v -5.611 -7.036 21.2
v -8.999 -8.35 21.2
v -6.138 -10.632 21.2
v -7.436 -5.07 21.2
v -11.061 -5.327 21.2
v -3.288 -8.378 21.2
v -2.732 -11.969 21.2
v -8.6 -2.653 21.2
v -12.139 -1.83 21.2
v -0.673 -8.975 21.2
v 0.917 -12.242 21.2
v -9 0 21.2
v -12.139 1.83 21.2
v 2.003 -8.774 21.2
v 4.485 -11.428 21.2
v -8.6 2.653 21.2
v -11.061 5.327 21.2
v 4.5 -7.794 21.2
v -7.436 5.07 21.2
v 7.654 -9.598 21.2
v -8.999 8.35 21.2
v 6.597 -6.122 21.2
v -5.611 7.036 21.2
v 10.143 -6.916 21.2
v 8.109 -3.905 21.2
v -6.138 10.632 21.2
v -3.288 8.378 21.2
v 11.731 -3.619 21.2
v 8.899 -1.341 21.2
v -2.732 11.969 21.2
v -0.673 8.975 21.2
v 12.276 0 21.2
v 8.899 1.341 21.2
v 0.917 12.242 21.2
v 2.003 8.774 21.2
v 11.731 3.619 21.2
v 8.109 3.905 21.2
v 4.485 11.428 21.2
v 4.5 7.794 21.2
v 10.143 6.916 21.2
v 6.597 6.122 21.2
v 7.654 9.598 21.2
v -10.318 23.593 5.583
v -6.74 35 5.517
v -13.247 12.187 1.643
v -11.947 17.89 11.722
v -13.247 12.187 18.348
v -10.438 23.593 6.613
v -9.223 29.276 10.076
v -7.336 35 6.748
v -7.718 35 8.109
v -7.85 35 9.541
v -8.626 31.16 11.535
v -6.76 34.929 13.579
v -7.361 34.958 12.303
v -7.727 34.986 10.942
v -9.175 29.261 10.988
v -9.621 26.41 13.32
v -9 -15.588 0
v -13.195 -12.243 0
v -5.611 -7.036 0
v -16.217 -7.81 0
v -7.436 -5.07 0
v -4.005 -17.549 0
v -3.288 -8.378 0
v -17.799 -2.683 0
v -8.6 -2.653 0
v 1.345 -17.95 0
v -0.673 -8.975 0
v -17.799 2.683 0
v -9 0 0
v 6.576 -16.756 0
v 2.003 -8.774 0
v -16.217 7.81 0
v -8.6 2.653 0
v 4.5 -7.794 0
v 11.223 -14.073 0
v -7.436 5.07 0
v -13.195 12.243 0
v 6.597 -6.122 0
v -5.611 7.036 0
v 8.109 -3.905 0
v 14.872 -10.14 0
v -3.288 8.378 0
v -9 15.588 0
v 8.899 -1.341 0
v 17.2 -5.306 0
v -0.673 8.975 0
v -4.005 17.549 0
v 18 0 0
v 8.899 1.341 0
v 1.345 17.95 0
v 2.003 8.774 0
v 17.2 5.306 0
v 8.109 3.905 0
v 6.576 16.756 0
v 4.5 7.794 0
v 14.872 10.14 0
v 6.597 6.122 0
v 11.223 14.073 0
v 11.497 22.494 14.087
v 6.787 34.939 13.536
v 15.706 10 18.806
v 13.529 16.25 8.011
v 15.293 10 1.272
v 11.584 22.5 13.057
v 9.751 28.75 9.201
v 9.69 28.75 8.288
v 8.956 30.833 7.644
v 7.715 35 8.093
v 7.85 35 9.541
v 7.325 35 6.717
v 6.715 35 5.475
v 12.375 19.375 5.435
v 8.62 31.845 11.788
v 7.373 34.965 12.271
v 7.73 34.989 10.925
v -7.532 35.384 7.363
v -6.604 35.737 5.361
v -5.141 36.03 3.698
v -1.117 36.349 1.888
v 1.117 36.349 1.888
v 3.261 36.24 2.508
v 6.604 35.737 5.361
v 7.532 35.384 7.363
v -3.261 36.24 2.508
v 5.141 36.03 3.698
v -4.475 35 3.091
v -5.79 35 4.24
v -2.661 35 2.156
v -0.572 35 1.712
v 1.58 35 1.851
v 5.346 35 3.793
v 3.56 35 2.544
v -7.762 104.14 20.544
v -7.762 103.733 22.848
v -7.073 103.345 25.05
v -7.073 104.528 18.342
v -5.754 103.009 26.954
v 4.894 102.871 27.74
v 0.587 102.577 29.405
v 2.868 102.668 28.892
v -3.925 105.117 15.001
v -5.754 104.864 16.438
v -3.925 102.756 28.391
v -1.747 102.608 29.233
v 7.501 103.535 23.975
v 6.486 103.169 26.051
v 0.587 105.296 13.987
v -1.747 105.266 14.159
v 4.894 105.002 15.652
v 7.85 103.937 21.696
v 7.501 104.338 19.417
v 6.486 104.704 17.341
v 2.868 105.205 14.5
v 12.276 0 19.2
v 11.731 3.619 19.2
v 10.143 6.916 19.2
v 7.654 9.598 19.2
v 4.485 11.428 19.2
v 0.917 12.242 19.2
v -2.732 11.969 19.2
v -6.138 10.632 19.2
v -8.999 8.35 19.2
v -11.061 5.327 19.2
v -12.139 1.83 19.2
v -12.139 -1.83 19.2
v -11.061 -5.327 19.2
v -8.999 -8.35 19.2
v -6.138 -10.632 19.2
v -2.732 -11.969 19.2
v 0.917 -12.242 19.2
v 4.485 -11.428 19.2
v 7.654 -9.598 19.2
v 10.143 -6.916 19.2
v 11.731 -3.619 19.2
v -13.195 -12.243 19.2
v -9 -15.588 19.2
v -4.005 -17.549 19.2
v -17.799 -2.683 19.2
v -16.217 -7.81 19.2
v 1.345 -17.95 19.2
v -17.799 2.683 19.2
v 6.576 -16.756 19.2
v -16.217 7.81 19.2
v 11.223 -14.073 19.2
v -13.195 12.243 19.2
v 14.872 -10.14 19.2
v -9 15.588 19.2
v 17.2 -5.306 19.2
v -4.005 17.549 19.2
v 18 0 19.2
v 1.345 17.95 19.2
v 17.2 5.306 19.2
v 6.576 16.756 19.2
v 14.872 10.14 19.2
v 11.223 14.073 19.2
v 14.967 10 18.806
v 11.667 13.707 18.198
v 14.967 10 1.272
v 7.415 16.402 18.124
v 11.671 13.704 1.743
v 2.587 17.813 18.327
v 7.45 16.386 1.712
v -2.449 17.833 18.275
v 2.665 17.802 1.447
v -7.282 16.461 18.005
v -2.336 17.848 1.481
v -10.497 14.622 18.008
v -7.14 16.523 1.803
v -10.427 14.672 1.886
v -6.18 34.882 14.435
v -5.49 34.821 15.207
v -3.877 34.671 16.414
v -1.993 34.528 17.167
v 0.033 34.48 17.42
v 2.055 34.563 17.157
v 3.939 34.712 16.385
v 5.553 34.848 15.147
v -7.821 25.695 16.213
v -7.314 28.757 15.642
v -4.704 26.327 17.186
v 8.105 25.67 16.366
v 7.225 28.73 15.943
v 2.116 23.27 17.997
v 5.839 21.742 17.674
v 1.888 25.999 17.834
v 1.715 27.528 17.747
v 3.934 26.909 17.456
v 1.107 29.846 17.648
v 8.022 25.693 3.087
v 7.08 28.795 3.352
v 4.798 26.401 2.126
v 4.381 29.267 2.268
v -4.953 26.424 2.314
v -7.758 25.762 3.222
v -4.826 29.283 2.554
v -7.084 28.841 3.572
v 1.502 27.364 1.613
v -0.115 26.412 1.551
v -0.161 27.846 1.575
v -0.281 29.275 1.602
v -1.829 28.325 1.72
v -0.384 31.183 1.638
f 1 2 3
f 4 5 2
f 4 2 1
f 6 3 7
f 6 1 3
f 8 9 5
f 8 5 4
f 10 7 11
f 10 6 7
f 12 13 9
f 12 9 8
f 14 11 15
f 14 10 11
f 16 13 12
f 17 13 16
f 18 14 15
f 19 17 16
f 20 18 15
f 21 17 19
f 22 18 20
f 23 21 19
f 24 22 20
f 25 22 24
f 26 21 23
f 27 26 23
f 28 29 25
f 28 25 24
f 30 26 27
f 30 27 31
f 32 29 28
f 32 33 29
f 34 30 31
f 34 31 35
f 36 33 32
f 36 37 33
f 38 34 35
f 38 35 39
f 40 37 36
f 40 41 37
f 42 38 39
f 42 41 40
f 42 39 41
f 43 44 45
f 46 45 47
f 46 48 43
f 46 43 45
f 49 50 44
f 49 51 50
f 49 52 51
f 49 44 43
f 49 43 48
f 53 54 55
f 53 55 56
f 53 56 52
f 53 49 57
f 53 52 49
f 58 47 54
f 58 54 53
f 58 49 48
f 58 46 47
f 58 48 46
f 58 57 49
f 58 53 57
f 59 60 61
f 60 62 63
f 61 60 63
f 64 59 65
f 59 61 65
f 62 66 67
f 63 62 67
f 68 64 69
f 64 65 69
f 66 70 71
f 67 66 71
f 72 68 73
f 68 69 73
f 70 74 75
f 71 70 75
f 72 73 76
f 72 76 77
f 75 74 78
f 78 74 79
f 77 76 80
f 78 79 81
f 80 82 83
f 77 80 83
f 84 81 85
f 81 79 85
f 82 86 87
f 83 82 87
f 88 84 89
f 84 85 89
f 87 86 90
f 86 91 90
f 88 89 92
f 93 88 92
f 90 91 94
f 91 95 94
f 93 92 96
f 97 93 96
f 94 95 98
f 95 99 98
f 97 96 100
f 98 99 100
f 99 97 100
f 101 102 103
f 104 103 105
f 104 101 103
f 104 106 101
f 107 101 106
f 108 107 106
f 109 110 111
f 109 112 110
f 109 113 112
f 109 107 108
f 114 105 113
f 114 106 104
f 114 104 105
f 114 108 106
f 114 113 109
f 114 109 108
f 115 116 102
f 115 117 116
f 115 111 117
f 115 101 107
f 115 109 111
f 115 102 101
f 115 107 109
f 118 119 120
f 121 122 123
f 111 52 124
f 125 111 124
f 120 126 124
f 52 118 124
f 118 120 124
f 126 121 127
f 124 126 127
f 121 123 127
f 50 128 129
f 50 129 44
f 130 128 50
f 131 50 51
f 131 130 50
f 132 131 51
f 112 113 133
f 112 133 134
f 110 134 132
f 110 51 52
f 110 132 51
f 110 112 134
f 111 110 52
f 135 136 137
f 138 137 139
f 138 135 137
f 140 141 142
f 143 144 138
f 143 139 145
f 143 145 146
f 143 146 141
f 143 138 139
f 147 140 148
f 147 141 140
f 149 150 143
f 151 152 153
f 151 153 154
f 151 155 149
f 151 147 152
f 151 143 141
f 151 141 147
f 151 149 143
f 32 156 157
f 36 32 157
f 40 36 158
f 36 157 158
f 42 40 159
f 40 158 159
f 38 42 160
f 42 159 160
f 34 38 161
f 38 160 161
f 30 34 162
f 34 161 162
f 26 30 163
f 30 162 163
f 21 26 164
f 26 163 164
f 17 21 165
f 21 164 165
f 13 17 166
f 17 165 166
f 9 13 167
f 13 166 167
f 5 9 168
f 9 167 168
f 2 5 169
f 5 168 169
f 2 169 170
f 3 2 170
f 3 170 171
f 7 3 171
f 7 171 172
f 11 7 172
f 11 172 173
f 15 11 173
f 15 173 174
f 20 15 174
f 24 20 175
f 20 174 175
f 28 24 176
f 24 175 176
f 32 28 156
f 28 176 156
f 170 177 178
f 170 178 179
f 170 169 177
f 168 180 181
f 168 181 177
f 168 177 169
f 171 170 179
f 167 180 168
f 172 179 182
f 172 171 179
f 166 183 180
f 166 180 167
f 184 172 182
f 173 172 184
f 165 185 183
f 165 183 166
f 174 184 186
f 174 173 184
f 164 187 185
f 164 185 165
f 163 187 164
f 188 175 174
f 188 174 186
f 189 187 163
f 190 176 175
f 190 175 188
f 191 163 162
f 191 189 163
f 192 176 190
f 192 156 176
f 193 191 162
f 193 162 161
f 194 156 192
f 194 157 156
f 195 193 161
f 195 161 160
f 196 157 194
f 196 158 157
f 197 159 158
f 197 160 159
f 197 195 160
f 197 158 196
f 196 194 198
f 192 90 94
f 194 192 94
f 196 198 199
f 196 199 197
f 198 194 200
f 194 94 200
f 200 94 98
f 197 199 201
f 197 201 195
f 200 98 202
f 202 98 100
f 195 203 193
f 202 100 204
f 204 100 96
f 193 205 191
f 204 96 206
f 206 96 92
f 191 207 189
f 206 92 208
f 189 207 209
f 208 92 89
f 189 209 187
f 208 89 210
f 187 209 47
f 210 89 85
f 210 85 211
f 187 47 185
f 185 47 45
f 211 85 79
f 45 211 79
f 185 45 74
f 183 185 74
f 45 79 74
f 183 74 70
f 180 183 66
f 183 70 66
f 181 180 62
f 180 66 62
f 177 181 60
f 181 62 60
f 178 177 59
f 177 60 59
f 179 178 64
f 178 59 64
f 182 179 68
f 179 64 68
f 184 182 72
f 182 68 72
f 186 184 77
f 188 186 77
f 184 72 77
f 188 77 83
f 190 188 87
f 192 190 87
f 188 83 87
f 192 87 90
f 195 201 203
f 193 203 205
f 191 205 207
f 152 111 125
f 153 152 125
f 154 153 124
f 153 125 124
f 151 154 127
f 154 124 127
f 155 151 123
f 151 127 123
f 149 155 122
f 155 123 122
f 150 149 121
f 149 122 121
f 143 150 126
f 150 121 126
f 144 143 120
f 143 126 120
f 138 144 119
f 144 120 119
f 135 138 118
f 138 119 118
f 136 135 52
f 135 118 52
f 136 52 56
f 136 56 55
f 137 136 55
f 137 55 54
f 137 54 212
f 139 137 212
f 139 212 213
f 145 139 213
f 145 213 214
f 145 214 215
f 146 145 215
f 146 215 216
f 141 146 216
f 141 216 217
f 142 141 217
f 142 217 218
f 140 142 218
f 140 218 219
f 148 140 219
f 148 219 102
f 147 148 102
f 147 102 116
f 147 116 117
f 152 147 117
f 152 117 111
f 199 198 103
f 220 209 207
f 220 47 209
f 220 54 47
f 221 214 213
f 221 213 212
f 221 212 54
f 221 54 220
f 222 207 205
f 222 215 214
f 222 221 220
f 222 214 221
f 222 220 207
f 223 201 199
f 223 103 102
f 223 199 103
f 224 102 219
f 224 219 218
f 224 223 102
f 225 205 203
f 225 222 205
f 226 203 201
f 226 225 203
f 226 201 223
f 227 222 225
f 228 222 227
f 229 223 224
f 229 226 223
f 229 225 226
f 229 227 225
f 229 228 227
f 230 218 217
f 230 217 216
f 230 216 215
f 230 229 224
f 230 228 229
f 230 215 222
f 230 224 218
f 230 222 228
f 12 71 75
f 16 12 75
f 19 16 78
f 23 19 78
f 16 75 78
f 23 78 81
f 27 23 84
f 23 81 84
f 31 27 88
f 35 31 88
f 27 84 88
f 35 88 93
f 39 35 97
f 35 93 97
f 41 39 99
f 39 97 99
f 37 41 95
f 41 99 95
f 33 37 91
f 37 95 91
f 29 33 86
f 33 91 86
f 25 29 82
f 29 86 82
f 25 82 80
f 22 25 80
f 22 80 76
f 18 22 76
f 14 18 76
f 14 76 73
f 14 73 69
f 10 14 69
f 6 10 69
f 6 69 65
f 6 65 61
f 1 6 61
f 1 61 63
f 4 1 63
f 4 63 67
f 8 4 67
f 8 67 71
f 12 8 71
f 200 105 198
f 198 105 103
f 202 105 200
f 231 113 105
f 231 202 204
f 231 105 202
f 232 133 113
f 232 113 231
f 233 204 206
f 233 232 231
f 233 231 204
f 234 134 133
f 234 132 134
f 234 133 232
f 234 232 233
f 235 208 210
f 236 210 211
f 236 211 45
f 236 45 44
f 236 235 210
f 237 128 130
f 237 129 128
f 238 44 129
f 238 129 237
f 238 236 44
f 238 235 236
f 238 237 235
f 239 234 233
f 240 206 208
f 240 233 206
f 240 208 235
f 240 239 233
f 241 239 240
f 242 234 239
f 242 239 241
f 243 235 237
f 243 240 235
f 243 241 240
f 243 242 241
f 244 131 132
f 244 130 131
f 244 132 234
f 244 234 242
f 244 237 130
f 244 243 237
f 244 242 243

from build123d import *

# Parameters (mm, degrees)
SKETCH1_R               = 18
BOSS_EXTRUDE1_DEPTH     = 19.2
SKETCH2_R               = 12.276458432
SKETCH2_R_2             = 8.347690183
BOSS_EXTRUDE2_DEPTH     = 2
SKETCH3_R               = 8.347690183
BOSS_EXTRUDE4_DEPTH     = 6.8
FILLET1_R               = 4
SKETCH13_R              = 9
CUT_EXTRUDE4_DEPTH      = 50
BOSS_EXTRUDE6_START     = 36.124968835
BOSS_EXTRUDE6_OUTLINE_R = 7.85
BOSS_EXTRUDE6_DEPTH     = 70


with BuildPart() as part:
    # Sketch1 → Boss-Extrude1 (new body)
    with BuildSketch(Plane.XY):
        Circle(SKETCH1_R)
    extrude(amount=BOSS_EXTRUDE1_DEPTH)

    # Sketch2 → Boss-Extrude2 (add)
    with BuildSketch(Plane.XY.offset(19.2)):
        Circle(SKETCH2_R)
        Circle(SKETCH2_R_2, mode=Mode.SUBTRACT)
    extrude(amount=BOSS_EXTRUDE2_DEPTH)

    # Sketch3 → Boss-Extrude4 (add)
    with BuildSketch(Plane.XY.offset(19.2)):
        Circle(SKETCH3_R)
    extrude(amount=BOSS_EXTRUDE4_DEPTH)

    # Fillet1
    fillet1_edges = [part.edges().sort_by_distance(p)[0] for p in [
        (-8.347690183, 0, 26),
    ]]
    fillet(fillet1_edges, radius=FILLET1_R)

    # Loft5: read off the stored shape, not the designer's step
    # Loft5: loft between two sections, ruled curve by curve
    loft5_from = [
        Edge.make_bspline([(-13.870540046, 10, 1.272084055), (-13.870540046, 10, 2.733260237), (-13.870540046, 10, 4.19443642), (-13.870540046, 10, 7.116788785), (-13.870540046, 10, 8.577964967), (-13.870540046, 10, 11.500317332), (-13.870540046, 10, 12.961493515), (-13.870540046, 10, 15.88384588), (-13.870540046, 10, 17.345022062), (-13.870540046, 10, 18.806198245)], [0, 0, 0, 0, 0.25, 0.25, 0.5, 0.5, 0.75, 0.75, 1, 1, 1, 1], 3),
        Edge.make_bspline([(-13.870540046, 10, 18.806198245), (-12.638187033, 10, 18.806198245), (-11.40583402, 10, 18.806198245), (-8.941127993, 10, 18.806198245), (-7.70877498, 10, 18.806198245), (-5.244068953, 10, 18.806198245), (-4.01171594, 10, 18.806198245), (-1.547009913, 10, 18.806198245), (-0.3146569, 10, 18.806198245), (2.150049127, 10, 18.806198245), (3.38240214, 10, 18.806198245), (5.847108167, 10, 18.806198245), (7.07946118, 10, 18.806198245), (9.544167207, 10, 18.806198245), (10.77652022, 10, 18.806198245), (13.241226247, 10, 18.806198245), (14.47357926, 10, 18.806198245), (15.705932273, 10, 18.806198245)], [0, 0, 0, 0, 0.125, 0.125, 0.25, 0.25, 0.375, 0.375, 0.5, 0.5, 0.625, 0.625, 0.75, 0.75, 0.875, 0.875, 1, 1, 1, 1], 3),
        Edge.make_bspline([(15.293044741, 10, 1.272084055), (14.077895375, 10, 1.272084055), (12.862746008, 10, 1.272084055), (10.432447276, 10, 1.272084055), (9.21729791, 10, 1.272084055), (6.786999178, 10, 1.272084055), (5.571849812, 10, 1.272084055), (3.141551079, 10, 1.272084055), (1.926401713, 10, 1.272084055), (-0.503897019, 10, 1.272084055), (-1.719046385, 10, 1.272084055), (-4.149345117, 10, 1.272084055), (-5.364494484, 10, 1.272084055), (-7.794793216, 10, 1.272084055), (-9.009942582, 10, 1.272084055), (-11.440241314, 10, 1.272084055), (-12.65539068, 10, 1.272084055), (-13.870540046, 10, 1.272084055)], [0, 0, 0, 0, 0.125, 0.125, 0.25, 0.25, 0.375, 0.375, 0.5, 0.5, 0.625, 0.625, 0.75, 0.75, 0.875, 0.875, 1, 1, 1, 1], 3),
        Edge.make_bspline([(15.705932273, 10, 18.806198245), (15.671524979, 10, 17.345022062), (15.637117685, 10, 15.88384588), (15.568303096, 10, 12.961493515), (15.533895801, 10, 11.500317332), (15.465081213, 10, 8.577964967), (15.430673918, 10, 7.116788785), (15.361859329, 10, 4.19443642), (15.327452035, 10, 2.733260237), (15.293044741, 10, 1.272084055)], [0, 0, 0, 0, 0.25, 0.25, 0.5, 0.5, 0.75, 0.75, 1, 1, 1, 1], 3),
    ]
    loft5_to = [
        Edge.make_bspline([(-6.740203008, 35, 5.516591807), (-7.083985671, 35, 6.09243536), (-7.365341755, 35, 6.734156051), (-7.74869442, 35, 8.097700335), (-7.85, 35, 8.818869121), (-7.85, 35, 10.26221196), (-7.74869442, 35, 10.983380746), (-7.365341755, 35, 12.34692503), (-7.083985671, 35, 12.988645721), (-6.740203008, 35, 13.564489274)], [0, 0, 0, 0, 0.25, 0.25, 0.5, 0.5, 0.75, 0.75, 1, 1, 1, 1], 3),
        Edge.make_bspline([(-6.740203008, 35, 13.564489274), (-6.451756257, 35, 14.047643954), (-6.092847535, 35, 14.530224597), (-5.218696772, 35, 15.438416605), (-4.702923047, 35, 15.863536141), (-3.528860323, 35, 16.586454489), (-2.870504053, 35, 16.883315453), (-1.466341415, 35, 17.286893217), (-0.721281456, 35, 17.392785885), (0.769354223, 35, 17.388221597), (1.513751736, 35, 17.277768249), (2.915416578, 35, 16.865599114), (3.57194256, 35, 16.564712015), (4.741556195, 35, 15.834617391), (5.254716863, 35, 15.406347285), (6.123289567, 35, 14.492819102), (6.479236287, 35, 14.00804959), (6.764718843, 35, 13.523137554)], [0, 0, 0, 0, 0.125, 0.125, 0.25, 0.25, 0.375, 0.375, 0.5, 0.5, 0.625, 0.625, 0.75, 0.75, 0.875, 0.875, 1, 1, 1, 1], 3),
        Edge.make_bspline([(6.714912928, 35, 5.474529674), (6.424525906, 35, 4.994962936), (6.064332724, 35, 4.516631942), (5.189797582, 35, 3.61755227), (4.674946594, 35, 3.197289059), (3.505304255, 35, 2.483288448), (2.850457816, 35, 2.190459602), (1.45515568, 35, 1.792552317), (0.715425599, 35, 1.688265686), (-0.76450524, 35, 1.692892109), (-1.503568847, 35, 1.801801607), (-2.896355935, 35, 2.208424757), (-3.549358764, 35, 2.50534208), (-4.714514202, 35, 3.226641519), (-5.226727577, 35, 3.650115443), (-6.095624443, 35, 4.55464527), (-6.452819986, 35, 5.035218898), (-6.740203008, 35, 5.516591807)], [0, 0, 0, 0, 0.125, 0.125, 0.25, 0.25, 0.375, 0.375, 0.5, 0.5, 0.625, 0.625, 0.75, 0.75, 0.875, 0.875, 1, 1, 1, 1], 3),
        Edge.make_bspline([(6.764718843, 35, 13.523137554), (7.105005207, 35, 12.945137428), (7.382450639, 35, 12.301626641), (7.757449733, 35, 10.935584457), (7.854315981, 35, 10.21371246), (7.845383427, 35, 8.770216678), (7.739590849, 35, 8.049598762), (7.347714599, 35, 6.68830211), (7.062326449, 35, 6.048274216), (6.714912928, 35, 5.474529674)], [0, 0, 0, 0, 0.25, 0.25, 0.5, 0.5, 0.75, 0.75, 1, 1, 1, 1], 3),
    ]
    loft5 = Solid(Shell([*[Face.make_surface_from_curves(loft5_from[k], loft5_to[k]) for k in range(4)], Face(Wire(loft5_from)), Face(Wire(loft5_to))]))
    add(loft5)

    # Sketch13 → Cut-Extrude4 (cut)
    with BuildSketch(Plane(origin=(0, 0, 0), x_dir=(-1, 0, 0), z_dir=(0, 0, -1))):
        Circle(SKETCH13_R)
    extrude(amount=-CUT_EXTRUDE4_DEPTH, mode=Mode.SUBTRACT)


with BuildPart() as boss_extrude6_tool:
    # Boss-Extrude6: read off the stored shape, not the designer's step
    # Boss-Extrude6 outline → Boss-Extrude6 (new body)
    with BuildSketch(Plane(origin=(0, 0, 0), x_dir=(1, 0, 0), z_dir=(0, 0.9848077530122076, 0.1736481776669339)).offset(BOSS_EXTRUDE6_START)):
        with Locations((0, -3.317912074)):
            Circle(BOSS_EXTRUDE6_OUTLINE_R)
    extrude(amount=BOSS_EXTRUDE6_DEPTH)


with BuildPart() as part_1:
    add(part.part)


with BuildPart() as part_2:
    # Boss-Extrude6: joined with boss_extrude6_tool
    add(part_1.part.fuse(boss_extrude6_tool.part, tol=0.00001))


solid = part_2.part
